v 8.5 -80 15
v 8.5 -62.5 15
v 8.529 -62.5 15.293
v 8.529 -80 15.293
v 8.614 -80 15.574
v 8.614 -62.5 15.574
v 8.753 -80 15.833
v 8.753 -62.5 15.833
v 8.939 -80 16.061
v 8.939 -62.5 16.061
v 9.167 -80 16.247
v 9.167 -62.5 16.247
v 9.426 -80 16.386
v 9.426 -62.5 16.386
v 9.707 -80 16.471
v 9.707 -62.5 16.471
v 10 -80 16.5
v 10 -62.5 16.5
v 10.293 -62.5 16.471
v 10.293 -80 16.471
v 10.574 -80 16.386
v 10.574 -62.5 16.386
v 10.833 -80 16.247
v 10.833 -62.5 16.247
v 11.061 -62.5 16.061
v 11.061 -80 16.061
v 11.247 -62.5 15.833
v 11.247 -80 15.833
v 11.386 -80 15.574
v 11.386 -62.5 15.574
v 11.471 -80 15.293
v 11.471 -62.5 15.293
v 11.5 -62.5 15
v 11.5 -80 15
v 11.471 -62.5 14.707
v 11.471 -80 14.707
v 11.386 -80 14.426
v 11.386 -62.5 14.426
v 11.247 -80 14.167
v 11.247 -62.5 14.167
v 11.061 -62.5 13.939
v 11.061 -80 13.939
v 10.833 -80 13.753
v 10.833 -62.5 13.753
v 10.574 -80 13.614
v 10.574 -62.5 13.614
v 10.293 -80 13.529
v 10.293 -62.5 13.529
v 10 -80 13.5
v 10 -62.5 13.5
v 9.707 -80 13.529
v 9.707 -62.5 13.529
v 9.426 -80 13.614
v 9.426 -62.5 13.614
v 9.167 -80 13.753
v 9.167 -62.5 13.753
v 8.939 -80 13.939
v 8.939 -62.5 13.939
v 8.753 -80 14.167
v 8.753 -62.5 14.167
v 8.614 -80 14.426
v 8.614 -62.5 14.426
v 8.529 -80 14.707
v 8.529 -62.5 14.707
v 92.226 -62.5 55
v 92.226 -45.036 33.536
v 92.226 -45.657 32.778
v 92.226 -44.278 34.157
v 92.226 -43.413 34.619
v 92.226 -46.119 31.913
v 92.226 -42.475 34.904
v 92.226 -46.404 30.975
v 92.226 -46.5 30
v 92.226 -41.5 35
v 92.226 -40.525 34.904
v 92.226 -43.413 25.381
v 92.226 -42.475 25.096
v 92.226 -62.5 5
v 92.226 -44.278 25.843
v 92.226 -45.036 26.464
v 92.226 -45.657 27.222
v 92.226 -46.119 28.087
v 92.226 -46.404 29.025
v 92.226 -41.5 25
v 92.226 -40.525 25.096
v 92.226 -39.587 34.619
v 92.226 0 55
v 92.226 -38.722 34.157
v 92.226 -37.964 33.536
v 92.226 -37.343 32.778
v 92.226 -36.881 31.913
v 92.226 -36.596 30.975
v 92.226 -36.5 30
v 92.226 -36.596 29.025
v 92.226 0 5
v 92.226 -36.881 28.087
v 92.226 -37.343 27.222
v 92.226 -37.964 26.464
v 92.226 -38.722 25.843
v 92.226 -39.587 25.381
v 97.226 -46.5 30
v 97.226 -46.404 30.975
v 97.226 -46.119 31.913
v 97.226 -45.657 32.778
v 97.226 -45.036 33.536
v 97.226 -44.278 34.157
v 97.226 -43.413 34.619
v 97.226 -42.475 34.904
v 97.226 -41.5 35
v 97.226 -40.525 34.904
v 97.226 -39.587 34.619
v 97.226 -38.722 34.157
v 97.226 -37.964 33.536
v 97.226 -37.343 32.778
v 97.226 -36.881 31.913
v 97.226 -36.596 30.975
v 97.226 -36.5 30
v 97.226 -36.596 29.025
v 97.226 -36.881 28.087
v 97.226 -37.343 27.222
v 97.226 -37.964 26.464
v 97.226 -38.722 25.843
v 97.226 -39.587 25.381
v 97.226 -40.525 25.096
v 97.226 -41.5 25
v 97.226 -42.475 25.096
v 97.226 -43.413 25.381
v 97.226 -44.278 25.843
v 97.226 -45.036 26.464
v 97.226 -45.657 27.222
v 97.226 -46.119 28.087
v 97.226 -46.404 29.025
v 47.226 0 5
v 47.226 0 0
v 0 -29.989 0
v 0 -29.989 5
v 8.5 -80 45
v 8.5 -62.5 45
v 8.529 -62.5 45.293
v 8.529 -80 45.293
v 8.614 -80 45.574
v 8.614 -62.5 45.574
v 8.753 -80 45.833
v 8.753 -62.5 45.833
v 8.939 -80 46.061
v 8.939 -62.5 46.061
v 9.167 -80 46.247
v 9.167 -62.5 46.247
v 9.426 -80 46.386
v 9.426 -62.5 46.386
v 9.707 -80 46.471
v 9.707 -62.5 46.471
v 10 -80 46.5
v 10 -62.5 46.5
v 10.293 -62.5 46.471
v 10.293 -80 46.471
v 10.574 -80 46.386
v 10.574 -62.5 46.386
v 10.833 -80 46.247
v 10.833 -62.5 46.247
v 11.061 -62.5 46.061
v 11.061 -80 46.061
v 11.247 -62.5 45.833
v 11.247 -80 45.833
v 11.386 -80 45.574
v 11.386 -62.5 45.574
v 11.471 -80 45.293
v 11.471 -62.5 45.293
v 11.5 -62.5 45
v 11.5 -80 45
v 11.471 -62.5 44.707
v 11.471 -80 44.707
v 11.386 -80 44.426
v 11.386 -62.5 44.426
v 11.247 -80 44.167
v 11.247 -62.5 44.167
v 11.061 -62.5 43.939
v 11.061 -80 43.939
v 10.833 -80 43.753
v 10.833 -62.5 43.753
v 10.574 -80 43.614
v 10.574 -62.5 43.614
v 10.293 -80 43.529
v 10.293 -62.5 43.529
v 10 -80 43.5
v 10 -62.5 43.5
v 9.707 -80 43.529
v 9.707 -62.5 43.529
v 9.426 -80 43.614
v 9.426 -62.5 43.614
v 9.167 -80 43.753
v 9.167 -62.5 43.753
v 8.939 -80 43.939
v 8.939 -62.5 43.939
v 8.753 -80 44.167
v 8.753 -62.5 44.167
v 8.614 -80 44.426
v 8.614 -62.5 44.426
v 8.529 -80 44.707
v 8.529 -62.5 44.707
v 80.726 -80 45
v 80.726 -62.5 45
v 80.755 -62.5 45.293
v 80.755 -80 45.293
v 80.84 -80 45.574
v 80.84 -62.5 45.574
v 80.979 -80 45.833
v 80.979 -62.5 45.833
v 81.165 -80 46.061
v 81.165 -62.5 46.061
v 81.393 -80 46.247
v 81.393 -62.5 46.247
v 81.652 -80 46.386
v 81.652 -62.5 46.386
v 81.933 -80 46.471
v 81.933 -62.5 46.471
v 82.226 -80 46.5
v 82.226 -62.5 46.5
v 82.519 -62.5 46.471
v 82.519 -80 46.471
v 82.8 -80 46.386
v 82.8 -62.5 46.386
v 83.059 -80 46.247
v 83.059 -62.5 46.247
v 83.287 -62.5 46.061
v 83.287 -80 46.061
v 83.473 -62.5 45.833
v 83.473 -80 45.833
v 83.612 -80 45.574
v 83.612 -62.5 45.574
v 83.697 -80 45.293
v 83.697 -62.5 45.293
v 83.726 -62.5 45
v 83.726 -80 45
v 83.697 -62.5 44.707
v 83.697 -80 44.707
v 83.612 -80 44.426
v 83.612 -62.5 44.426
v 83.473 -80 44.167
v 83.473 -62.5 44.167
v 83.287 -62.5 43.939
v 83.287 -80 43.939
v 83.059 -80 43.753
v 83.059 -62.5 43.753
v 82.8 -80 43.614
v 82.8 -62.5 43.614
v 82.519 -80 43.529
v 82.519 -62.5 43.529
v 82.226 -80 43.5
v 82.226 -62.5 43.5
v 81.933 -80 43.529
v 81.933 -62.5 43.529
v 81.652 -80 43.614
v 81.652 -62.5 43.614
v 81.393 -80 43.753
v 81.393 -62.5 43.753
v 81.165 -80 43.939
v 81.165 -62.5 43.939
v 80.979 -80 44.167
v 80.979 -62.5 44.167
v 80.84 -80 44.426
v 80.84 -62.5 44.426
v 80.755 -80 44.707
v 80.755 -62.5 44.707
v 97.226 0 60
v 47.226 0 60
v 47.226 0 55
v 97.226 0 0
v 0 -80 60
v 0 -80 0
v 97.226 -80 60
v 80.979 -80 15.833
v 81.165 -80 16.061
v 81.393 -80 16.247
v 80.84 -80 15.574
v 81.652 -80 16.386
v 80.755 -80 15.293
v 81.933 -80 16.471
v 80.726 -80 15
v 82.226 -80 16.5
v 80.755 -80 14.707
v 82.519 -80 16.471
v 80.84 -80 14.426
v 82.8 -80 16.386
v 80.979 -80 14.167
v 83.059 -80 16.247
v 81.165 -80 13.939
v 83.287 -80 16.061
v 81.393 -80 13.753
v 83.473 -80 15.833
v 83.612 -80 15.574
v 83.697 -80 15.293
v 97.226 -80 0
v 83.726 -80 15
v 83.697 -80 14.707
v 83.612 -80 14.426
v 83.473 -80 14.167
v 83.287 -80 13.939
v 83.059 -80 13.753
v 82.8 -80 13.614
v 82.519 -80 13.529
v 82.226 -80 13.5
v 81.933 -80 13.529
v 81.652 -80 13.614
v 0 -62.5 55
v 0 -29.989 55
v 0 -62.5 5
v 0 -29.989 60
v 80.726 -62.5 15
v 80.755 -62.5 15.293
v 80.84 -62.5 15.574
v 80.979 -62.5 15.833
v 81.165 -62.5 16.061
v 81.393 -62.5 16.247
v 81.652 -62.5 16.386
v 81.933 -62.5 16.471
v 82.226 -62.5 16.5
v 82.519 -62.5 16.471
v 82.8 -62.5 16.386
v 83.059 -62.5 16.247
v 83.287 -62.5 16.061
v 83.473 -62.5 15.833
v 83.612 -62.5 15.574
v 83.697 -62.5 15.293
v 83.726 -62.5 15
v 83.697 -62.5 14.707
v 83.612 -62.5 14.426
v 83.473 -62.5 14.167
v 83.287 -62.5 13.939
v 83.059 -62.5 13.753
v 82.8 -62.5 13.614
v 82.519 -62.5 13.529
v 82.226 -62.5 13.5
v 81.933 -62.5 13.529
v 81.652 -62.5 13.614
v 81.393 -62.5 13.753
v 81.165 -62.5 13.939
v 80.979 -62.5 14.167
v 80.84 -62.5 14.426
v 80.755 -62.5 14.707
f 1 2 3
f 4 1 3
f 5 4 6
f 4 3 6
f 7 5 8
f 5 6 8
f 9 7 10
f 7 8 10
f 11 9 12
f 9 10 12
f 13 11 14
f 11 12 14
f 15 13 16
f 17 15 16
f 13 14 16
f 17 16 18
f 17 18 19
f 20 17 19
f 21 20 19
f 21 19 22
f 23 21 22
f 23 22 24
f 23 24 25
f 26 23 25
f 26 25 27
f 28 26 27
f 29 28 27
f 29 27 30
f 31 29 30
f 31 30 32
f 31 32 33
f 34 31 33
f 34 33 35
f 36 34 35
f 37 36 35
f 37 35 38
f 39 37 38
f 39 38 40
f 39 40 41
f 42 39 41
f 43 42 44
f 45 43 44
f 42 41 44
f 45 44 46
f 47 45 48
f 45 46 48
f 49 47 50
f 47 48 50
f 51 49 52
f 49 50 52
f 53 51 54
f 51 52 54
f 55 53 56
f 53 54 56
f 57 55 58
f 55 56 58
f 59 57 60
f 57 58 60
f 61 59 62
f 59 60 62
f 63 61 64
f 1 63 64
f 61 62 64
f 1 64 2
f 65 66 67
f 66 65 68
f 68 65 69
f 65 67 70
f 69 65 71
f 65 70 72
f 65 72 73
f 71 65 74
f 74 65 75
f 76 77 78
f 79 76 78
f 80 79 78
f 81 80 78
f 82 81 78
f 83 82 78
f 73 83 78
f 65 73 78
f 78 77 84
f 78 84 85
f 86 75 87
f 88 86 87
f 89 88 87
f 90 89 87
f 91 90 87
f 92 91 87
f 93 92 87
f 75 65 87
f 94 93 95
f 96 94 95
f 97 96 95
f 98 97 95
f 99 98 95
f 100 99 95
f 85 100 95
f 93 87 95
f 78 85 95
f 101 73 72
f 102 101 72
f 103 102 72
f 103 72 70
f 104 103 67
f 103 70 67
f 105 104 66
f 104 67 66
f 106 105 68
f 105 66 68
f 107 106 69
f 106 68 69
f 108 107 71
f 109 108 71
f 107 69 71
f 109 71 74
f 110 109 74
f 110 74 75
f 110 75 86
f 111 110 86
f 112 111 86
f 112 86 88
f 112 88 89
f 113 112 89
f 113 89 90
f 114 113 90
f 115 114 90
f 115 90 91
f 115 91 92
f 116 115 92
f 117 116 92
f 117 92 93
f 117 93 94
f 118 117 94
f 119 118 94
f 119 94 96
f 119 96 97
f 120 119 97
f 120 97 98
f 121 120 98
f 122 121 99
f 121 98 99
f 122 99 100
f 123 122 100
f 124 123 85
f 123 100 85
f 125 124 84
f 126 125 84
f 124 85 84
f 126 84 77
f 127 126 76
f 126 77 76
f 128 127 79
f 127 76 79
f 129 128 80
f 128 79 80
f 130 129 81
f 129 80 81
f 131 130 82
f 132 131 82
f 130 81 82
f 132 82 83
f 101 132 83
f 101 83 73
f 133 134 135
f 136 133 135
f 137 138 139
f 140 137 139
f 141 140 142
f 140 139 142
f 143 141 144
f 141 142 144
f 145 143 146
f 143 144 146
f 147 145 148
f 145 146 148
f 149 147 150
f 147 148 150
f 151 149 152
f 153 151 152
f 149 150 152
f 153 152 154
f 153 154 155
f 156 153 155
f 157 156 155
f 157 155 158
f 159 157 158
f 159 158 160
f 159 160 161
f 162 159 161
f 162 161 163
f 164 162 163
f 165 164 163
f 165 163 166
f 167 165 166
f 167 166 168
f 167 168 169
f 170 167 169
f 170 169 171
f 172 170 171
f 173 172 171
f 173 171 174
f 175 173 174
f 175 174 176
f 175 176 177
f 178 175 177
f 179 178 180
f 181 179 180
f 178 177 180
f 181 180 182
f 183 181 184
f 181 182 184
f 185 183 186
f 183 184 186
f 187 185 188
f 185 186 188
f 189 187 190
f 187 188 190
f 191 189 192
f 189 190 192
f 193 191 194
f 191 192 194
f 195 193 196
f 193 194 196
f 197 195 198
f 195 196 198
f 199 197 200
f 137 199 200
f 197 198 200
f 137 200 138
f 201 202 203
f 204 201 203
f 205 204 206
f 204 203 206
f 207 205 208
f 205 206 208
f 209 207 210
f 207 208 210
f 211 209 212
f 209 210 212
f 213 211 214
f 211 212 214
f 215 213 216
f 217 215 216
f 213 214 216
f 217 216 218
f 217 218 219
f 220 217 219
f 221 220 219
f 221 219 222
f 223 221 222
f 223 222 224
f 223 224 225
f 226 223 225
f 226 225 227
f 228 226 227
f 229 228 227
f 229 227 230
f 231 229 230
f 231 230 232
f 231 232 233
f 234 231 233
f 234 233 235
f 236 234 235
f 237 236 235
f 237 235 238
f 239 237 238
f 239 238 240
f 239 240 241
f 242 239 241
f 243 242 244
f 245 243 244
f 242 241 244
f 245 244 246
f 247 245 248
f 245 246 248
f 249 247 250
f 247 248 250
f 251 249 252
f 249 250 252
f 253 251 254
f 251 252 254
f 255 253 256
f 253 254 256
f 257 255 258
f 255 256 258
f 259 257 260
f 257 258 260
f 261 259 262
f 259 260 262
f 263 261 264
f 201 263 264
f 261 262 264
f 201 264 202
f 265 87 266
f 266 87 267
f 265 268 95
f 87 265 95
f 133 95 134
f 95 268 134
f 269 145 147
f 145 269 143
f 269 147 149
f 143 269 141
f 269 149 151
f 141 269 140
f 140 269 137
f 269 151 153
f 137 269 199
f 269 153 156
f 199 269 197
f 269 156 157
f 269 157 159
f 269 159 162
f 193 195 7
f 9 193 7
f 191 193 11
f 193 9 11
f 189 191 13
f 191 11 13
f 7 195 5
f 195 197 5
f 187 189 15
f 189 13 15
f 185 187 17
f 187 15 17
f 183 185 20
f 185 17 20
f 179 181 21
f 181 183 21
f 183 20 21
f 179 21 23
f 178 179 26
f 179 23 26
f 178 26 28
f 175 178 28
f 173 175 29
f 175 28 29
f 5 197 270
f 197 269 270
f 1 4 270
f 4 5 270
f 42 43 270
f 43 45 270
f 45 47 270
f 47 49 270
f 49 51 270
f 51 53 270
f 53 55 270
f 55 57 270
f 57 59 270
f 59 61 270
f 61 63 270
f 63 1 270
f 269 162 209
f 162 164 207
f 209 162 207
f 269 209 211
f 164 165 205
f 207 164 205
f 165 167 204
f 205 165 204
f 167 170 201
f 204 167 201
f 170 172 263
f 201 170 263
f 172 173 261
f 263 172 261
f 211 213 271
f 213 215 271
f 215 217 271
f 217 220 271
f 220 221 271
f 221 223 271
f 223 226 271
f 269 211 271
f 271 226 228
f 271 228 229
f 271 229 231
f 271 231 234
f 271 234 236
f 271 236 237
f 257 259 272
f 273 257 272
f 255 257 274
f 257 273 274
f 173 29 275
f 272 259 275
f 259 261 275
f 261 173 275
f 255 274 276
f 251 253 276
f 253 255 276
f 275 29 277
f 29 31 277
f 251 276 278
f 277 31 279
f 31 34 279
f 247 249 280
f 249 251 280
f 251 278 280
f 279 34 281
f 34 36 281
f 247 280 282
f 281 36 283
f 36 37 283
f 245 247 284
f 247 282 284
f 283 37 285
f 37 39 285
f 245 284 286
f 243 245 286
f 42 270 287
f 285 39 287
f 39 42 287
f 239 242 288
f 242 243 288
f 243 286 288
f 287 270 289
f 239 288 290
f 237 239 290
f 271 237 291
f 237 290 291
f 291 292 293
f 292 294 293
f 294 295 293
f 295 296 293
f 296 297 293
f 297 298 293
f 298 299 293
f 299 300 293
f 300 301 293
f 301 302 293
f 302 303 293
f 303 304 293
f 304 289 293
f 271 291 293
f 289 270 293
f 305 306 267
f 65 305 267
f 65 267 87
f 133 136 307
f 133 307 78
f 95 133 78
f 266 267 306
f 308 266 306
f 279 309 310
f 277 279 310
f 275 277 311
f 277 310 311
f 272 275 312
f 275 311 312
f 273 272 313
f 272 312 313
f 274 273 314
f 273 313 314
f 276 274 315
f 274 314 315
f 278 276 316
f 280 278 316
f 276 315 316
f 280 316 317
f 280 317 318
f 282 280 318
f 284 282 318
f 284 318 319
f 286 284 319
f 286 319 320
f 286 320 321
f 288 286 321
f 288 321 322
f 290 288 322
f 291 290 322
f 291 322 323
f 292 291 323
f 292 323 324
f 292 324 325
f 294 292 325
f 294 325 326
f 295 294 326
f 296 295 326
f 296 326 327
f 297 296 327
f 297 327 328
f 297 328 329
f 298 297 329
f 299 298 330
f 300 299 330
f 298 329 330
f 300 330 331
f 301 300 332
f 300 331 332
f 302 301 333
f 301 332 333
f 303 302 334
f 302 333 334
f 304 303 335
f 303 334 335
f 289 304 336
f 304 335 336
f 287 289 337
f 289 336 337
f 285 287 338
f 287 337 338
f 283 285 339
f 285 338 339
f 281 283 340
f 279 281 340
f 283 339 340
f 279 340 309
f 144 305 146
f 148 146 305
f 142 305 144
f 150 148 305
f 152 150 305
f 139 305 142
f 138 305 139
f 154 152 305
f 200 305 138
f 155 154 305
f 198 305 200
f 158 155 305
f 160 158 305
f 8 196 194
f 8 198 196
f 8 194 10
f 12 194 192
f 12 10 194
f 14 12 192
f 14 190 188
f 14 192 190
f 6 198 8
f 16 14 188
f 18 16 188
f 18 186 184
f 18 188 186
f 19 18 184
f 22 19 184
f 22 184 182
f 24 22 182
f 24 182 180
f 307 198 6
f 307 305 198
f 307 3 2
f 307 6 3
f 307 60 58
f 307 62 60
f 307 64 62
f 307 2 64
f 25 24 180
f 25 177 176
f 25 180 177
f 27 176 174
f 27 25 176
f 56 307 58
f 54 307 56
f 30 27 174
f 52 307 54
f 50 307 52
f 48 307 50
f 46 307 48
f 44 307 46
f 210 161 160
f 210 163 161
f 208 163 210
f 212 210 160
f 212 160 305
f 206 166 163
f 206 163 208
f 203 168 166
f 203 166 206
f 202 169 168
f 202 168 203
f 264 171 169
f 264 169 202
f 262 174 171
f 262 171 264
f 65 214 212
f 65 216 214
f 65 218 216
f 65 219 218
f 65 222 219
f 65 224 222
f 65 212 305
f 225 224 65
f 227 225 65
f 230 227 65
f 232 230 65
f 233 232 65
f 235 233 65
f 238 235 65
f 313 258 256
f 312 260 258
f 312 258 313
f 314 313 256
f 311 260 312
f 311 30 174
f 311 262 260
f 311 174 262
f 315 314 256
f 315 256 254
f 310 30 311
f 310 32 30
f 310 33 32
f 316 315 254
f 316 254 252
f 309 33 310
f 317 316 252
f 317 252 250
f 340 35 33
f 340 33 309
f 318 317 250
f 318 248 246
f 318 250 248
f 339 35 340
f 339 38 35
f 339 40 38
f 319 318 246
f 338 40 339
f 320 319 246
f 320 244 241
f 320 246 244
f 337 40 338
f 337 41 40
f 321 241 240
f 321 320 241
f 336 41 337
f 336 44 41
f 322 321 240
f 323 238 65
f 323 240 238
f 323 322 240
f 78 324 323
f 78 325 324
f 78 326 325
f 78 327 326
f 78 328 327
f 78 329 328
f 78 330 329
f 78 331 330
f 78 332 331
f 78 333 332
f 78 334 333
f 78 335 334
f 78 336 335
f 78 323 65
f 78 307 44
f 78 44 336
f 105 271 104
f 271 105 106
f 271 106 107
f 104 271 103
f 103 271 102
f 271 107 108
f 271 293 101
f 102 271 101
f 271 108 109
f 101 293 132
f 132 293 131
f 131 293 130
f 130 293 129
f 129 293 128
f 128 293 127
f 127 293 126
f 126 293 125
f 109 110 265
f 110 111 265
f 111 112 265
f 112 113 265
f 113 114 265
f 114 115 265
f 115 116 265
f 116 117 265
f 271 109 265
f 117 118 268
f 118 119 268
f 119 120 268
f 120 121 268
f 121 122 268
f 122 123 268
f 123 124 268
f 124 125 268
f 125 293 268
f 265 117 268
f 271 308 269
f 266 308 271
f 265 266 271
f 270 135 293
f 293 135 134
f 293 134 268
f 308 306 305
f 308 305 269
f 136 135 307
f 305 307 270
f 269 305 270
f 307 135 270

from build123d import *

# Parameters (mm, degrees)
BOSS_EXTRUDE1_DEPTH = 60
SKETCH3_W           = 50
SKETCH3_H           = 57.5
CUT_EXTRUDE6_DEPTH  = 80
SKETCH9_R           = 5
CUT_EXTRUDE7_DEPTH  = 80
SKETCH10_W          = 61.517068372
SKETCH10_H          = 50
CUT_EXTRUDE8_DEPTH  = 62.5
SKETCH13_R          = 1.5
CUT_EXTRUDE9_DEPTH  = 131.227197428


with BuildPart() as part:
    # Sketch1 → Boss-Extrude1 (new body)
    with BuildSketch(Plane.XY):
        Polygon((97.225886213, 0), (47.225886213, 0), (0, -29.989383259), (0, -80), (97.225886213, -80), align=None)
    extrude(amount=BOSS_EXTRUDE1_DEPTH)

    # Sketch3 → Cut-Extrude6 (cut)
    with BuildSketch(Plane.ZY):
        with Locations((30, -33.75)):
            Rectangle(SKETCH3_W, SKETCH3_H)
    extrude(amount=-CUT_EXTRUDE6_DEPTH, mode=Mode.SUBTRACT)

    # Sketch9 → Cut-Extrude7 (cut)
    with BuildSketch(Plane.ZY.offset(-80)):
        with Locations(Location((30, -41.5, 0), (0, 0, 270))):
            Circle(SKETCH9_R)
    extrude(amount=-CUT_EXTRUDE7_DEPTH, mode=Mode.SUBTRACT)

    # Sketch10 → Cut-Extrude8 (cut)
    with BuildSketch(Plane(origin=(0, 0, 0), x_dir=(1, 0, 0), z_dir=(0, 1, 0))):
        with Locations((61.467352027, -30)):
            Rectangle(SKETCH10_W, SKETCH10_H)
    extrude(amount=-CUT_EXTRUDE8_DEPTH, mode=Mode.SUBTRACT)

    # Sketch13 → Cut-Extrude9 (cut, through all)
    with BuildSketch(Plane(origin=(0, -62.5, 0), x_dir=(1, 0, 0), z_dir=(0, 1, 0))):
        with Locations(Location((10, -15, 0), (0, 0, 180))):
            Circle(SKETCH13_R)
        with Locations(Location((82.225886213, -15, 0), (0, 0, 180))):
            Circle(SKETCH13_R)
        with Locations(Location((10, -45, 0), (0, 0, 180))):
            Circle(SKETCH13_R)
        with Locations(Location((82.225886213, -45, 0), (0, 0, 180))):
            Circle(SKETCH13_R)
    extrude(amount=-CUT_EXTRUDE9_DEPTH, mode=Mode.SUBTRACT)


solid = part.part
